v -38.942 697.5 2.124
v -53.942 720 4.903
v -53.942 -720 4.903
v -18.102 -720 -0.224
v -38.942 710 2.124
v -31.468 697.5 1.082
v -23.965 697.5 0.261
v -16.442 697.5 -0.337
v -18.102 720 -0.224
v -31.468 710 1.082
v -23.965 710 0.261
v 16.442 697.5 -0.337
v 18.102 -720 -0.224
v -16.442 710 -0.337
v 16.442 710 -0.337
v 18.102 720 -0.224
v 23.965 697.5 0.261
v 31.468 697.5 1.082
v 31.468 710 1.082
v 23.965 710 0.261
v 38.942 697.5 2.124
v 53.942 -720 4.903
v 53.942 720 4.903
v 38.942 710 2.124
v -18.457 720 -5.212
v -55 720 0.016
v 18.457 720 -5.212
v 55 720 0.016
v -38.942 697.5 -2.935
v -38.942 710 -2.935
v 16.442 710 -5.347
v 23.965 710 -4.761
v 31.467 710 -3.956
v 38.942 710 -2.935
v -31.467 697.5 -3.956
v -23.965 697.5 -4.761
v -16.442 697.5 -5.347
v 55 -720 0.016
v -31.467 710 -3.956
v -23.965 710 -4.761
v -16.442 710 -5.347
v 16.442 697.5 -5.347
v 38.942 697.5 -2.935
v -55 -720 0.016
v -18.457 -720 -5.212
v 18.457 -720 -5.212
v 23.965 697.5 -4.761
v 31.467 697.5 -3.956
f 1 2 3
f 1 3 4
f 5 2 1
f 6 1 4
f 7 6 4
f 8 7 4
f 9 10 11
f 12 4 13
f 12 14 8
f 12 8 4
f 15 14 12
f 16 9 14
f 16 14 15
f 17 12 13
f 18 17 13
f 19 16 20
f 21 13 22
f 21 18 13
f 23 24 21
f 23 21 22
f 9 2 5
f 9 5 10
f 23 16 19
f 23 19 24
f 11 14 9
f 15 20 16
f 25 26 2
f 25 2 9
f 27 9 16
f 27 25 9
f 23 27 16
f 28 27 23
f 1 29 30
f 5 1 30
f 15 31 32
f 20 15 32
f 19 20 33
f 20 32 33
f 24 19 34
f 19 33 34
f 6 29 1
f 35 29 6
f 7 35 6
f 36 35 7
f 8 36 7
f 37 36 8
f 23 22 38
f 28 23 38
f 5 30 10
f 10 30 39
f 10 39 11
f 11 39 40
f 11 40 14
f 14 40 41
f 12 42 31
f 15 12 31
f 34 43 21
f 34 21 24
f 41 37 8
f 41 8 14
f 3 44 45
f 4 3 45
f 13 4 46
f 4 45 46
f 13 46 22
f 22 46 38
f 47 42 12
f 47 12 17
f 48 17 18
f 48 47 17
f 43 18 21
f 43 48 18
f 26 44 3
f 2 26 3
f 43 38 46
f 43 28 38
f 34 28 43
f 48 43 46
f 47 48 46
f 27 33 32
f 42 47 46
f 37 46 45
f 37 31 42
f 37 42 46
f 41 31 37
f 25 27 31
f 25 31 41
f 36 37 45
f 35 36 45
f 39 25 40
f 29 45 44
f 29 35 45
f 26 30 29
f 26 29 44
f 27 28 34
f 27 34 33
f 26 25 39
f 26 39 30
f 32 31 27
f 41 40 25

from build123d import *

# Parameters (mm, degrees)
BOSS_EXTRUDE1_DEPTH     = 720
CUT_EXTRUDE6_DEPTH      = 723.121476834
CUT_EXTRUDE6_DEPTH_BACK = 723.121476834
SKETCH8_W               = 22.5
SKETCH8_H               = 12.5


with BuildPart() as part:
    # Sketch3 → Boss-Extrude1 (new, symmetric)
    with BuildSketch(Plane(origin=(0, 0, 0), x_dir=(1, 0, 0), z_dir=(0, 1, 0))):
        with BuildLine():
            Line((-55, -0.016406212), (-53.942307692, -4.903254581))
            ThreePointArc((-53.942307692, -4.903254581), (0, 0.867478597), (53.942307692, -4.903254581))
            Line((53.942307692, -4.903254581), (55, -0.016406212))
            ThreePointArc((55, -0.016406212), (0, 5.867478597), (-55, -0.016406212))
        make_face()
    extrude(amount=BOSS_EXTRUDE1_DEPTH, both=True)

    # Sketch8 → Cut-Extrude6 (cut, two sides: drawn at the far end of the back side and taken through both)
    with BuildSketch(Plane.XY.offset(-CUT_EXTRUDE6_DEPTH_BACK)):
        with Locations((-27.692307692, 703.75)):
            Rectangle(SKETCH8_W, SKETCH8_H)
        with Locations((27.692307692, 703.75)):
            Rectangle(SKETCH8_W, SKETCH8_H)
    extrude(amount=CUT_EXTRUDE6_DEPTH + CUT_EXTRUDE6_DEPTH_BACK, mode=Mode.SUBTRACT)


solid = part.part
